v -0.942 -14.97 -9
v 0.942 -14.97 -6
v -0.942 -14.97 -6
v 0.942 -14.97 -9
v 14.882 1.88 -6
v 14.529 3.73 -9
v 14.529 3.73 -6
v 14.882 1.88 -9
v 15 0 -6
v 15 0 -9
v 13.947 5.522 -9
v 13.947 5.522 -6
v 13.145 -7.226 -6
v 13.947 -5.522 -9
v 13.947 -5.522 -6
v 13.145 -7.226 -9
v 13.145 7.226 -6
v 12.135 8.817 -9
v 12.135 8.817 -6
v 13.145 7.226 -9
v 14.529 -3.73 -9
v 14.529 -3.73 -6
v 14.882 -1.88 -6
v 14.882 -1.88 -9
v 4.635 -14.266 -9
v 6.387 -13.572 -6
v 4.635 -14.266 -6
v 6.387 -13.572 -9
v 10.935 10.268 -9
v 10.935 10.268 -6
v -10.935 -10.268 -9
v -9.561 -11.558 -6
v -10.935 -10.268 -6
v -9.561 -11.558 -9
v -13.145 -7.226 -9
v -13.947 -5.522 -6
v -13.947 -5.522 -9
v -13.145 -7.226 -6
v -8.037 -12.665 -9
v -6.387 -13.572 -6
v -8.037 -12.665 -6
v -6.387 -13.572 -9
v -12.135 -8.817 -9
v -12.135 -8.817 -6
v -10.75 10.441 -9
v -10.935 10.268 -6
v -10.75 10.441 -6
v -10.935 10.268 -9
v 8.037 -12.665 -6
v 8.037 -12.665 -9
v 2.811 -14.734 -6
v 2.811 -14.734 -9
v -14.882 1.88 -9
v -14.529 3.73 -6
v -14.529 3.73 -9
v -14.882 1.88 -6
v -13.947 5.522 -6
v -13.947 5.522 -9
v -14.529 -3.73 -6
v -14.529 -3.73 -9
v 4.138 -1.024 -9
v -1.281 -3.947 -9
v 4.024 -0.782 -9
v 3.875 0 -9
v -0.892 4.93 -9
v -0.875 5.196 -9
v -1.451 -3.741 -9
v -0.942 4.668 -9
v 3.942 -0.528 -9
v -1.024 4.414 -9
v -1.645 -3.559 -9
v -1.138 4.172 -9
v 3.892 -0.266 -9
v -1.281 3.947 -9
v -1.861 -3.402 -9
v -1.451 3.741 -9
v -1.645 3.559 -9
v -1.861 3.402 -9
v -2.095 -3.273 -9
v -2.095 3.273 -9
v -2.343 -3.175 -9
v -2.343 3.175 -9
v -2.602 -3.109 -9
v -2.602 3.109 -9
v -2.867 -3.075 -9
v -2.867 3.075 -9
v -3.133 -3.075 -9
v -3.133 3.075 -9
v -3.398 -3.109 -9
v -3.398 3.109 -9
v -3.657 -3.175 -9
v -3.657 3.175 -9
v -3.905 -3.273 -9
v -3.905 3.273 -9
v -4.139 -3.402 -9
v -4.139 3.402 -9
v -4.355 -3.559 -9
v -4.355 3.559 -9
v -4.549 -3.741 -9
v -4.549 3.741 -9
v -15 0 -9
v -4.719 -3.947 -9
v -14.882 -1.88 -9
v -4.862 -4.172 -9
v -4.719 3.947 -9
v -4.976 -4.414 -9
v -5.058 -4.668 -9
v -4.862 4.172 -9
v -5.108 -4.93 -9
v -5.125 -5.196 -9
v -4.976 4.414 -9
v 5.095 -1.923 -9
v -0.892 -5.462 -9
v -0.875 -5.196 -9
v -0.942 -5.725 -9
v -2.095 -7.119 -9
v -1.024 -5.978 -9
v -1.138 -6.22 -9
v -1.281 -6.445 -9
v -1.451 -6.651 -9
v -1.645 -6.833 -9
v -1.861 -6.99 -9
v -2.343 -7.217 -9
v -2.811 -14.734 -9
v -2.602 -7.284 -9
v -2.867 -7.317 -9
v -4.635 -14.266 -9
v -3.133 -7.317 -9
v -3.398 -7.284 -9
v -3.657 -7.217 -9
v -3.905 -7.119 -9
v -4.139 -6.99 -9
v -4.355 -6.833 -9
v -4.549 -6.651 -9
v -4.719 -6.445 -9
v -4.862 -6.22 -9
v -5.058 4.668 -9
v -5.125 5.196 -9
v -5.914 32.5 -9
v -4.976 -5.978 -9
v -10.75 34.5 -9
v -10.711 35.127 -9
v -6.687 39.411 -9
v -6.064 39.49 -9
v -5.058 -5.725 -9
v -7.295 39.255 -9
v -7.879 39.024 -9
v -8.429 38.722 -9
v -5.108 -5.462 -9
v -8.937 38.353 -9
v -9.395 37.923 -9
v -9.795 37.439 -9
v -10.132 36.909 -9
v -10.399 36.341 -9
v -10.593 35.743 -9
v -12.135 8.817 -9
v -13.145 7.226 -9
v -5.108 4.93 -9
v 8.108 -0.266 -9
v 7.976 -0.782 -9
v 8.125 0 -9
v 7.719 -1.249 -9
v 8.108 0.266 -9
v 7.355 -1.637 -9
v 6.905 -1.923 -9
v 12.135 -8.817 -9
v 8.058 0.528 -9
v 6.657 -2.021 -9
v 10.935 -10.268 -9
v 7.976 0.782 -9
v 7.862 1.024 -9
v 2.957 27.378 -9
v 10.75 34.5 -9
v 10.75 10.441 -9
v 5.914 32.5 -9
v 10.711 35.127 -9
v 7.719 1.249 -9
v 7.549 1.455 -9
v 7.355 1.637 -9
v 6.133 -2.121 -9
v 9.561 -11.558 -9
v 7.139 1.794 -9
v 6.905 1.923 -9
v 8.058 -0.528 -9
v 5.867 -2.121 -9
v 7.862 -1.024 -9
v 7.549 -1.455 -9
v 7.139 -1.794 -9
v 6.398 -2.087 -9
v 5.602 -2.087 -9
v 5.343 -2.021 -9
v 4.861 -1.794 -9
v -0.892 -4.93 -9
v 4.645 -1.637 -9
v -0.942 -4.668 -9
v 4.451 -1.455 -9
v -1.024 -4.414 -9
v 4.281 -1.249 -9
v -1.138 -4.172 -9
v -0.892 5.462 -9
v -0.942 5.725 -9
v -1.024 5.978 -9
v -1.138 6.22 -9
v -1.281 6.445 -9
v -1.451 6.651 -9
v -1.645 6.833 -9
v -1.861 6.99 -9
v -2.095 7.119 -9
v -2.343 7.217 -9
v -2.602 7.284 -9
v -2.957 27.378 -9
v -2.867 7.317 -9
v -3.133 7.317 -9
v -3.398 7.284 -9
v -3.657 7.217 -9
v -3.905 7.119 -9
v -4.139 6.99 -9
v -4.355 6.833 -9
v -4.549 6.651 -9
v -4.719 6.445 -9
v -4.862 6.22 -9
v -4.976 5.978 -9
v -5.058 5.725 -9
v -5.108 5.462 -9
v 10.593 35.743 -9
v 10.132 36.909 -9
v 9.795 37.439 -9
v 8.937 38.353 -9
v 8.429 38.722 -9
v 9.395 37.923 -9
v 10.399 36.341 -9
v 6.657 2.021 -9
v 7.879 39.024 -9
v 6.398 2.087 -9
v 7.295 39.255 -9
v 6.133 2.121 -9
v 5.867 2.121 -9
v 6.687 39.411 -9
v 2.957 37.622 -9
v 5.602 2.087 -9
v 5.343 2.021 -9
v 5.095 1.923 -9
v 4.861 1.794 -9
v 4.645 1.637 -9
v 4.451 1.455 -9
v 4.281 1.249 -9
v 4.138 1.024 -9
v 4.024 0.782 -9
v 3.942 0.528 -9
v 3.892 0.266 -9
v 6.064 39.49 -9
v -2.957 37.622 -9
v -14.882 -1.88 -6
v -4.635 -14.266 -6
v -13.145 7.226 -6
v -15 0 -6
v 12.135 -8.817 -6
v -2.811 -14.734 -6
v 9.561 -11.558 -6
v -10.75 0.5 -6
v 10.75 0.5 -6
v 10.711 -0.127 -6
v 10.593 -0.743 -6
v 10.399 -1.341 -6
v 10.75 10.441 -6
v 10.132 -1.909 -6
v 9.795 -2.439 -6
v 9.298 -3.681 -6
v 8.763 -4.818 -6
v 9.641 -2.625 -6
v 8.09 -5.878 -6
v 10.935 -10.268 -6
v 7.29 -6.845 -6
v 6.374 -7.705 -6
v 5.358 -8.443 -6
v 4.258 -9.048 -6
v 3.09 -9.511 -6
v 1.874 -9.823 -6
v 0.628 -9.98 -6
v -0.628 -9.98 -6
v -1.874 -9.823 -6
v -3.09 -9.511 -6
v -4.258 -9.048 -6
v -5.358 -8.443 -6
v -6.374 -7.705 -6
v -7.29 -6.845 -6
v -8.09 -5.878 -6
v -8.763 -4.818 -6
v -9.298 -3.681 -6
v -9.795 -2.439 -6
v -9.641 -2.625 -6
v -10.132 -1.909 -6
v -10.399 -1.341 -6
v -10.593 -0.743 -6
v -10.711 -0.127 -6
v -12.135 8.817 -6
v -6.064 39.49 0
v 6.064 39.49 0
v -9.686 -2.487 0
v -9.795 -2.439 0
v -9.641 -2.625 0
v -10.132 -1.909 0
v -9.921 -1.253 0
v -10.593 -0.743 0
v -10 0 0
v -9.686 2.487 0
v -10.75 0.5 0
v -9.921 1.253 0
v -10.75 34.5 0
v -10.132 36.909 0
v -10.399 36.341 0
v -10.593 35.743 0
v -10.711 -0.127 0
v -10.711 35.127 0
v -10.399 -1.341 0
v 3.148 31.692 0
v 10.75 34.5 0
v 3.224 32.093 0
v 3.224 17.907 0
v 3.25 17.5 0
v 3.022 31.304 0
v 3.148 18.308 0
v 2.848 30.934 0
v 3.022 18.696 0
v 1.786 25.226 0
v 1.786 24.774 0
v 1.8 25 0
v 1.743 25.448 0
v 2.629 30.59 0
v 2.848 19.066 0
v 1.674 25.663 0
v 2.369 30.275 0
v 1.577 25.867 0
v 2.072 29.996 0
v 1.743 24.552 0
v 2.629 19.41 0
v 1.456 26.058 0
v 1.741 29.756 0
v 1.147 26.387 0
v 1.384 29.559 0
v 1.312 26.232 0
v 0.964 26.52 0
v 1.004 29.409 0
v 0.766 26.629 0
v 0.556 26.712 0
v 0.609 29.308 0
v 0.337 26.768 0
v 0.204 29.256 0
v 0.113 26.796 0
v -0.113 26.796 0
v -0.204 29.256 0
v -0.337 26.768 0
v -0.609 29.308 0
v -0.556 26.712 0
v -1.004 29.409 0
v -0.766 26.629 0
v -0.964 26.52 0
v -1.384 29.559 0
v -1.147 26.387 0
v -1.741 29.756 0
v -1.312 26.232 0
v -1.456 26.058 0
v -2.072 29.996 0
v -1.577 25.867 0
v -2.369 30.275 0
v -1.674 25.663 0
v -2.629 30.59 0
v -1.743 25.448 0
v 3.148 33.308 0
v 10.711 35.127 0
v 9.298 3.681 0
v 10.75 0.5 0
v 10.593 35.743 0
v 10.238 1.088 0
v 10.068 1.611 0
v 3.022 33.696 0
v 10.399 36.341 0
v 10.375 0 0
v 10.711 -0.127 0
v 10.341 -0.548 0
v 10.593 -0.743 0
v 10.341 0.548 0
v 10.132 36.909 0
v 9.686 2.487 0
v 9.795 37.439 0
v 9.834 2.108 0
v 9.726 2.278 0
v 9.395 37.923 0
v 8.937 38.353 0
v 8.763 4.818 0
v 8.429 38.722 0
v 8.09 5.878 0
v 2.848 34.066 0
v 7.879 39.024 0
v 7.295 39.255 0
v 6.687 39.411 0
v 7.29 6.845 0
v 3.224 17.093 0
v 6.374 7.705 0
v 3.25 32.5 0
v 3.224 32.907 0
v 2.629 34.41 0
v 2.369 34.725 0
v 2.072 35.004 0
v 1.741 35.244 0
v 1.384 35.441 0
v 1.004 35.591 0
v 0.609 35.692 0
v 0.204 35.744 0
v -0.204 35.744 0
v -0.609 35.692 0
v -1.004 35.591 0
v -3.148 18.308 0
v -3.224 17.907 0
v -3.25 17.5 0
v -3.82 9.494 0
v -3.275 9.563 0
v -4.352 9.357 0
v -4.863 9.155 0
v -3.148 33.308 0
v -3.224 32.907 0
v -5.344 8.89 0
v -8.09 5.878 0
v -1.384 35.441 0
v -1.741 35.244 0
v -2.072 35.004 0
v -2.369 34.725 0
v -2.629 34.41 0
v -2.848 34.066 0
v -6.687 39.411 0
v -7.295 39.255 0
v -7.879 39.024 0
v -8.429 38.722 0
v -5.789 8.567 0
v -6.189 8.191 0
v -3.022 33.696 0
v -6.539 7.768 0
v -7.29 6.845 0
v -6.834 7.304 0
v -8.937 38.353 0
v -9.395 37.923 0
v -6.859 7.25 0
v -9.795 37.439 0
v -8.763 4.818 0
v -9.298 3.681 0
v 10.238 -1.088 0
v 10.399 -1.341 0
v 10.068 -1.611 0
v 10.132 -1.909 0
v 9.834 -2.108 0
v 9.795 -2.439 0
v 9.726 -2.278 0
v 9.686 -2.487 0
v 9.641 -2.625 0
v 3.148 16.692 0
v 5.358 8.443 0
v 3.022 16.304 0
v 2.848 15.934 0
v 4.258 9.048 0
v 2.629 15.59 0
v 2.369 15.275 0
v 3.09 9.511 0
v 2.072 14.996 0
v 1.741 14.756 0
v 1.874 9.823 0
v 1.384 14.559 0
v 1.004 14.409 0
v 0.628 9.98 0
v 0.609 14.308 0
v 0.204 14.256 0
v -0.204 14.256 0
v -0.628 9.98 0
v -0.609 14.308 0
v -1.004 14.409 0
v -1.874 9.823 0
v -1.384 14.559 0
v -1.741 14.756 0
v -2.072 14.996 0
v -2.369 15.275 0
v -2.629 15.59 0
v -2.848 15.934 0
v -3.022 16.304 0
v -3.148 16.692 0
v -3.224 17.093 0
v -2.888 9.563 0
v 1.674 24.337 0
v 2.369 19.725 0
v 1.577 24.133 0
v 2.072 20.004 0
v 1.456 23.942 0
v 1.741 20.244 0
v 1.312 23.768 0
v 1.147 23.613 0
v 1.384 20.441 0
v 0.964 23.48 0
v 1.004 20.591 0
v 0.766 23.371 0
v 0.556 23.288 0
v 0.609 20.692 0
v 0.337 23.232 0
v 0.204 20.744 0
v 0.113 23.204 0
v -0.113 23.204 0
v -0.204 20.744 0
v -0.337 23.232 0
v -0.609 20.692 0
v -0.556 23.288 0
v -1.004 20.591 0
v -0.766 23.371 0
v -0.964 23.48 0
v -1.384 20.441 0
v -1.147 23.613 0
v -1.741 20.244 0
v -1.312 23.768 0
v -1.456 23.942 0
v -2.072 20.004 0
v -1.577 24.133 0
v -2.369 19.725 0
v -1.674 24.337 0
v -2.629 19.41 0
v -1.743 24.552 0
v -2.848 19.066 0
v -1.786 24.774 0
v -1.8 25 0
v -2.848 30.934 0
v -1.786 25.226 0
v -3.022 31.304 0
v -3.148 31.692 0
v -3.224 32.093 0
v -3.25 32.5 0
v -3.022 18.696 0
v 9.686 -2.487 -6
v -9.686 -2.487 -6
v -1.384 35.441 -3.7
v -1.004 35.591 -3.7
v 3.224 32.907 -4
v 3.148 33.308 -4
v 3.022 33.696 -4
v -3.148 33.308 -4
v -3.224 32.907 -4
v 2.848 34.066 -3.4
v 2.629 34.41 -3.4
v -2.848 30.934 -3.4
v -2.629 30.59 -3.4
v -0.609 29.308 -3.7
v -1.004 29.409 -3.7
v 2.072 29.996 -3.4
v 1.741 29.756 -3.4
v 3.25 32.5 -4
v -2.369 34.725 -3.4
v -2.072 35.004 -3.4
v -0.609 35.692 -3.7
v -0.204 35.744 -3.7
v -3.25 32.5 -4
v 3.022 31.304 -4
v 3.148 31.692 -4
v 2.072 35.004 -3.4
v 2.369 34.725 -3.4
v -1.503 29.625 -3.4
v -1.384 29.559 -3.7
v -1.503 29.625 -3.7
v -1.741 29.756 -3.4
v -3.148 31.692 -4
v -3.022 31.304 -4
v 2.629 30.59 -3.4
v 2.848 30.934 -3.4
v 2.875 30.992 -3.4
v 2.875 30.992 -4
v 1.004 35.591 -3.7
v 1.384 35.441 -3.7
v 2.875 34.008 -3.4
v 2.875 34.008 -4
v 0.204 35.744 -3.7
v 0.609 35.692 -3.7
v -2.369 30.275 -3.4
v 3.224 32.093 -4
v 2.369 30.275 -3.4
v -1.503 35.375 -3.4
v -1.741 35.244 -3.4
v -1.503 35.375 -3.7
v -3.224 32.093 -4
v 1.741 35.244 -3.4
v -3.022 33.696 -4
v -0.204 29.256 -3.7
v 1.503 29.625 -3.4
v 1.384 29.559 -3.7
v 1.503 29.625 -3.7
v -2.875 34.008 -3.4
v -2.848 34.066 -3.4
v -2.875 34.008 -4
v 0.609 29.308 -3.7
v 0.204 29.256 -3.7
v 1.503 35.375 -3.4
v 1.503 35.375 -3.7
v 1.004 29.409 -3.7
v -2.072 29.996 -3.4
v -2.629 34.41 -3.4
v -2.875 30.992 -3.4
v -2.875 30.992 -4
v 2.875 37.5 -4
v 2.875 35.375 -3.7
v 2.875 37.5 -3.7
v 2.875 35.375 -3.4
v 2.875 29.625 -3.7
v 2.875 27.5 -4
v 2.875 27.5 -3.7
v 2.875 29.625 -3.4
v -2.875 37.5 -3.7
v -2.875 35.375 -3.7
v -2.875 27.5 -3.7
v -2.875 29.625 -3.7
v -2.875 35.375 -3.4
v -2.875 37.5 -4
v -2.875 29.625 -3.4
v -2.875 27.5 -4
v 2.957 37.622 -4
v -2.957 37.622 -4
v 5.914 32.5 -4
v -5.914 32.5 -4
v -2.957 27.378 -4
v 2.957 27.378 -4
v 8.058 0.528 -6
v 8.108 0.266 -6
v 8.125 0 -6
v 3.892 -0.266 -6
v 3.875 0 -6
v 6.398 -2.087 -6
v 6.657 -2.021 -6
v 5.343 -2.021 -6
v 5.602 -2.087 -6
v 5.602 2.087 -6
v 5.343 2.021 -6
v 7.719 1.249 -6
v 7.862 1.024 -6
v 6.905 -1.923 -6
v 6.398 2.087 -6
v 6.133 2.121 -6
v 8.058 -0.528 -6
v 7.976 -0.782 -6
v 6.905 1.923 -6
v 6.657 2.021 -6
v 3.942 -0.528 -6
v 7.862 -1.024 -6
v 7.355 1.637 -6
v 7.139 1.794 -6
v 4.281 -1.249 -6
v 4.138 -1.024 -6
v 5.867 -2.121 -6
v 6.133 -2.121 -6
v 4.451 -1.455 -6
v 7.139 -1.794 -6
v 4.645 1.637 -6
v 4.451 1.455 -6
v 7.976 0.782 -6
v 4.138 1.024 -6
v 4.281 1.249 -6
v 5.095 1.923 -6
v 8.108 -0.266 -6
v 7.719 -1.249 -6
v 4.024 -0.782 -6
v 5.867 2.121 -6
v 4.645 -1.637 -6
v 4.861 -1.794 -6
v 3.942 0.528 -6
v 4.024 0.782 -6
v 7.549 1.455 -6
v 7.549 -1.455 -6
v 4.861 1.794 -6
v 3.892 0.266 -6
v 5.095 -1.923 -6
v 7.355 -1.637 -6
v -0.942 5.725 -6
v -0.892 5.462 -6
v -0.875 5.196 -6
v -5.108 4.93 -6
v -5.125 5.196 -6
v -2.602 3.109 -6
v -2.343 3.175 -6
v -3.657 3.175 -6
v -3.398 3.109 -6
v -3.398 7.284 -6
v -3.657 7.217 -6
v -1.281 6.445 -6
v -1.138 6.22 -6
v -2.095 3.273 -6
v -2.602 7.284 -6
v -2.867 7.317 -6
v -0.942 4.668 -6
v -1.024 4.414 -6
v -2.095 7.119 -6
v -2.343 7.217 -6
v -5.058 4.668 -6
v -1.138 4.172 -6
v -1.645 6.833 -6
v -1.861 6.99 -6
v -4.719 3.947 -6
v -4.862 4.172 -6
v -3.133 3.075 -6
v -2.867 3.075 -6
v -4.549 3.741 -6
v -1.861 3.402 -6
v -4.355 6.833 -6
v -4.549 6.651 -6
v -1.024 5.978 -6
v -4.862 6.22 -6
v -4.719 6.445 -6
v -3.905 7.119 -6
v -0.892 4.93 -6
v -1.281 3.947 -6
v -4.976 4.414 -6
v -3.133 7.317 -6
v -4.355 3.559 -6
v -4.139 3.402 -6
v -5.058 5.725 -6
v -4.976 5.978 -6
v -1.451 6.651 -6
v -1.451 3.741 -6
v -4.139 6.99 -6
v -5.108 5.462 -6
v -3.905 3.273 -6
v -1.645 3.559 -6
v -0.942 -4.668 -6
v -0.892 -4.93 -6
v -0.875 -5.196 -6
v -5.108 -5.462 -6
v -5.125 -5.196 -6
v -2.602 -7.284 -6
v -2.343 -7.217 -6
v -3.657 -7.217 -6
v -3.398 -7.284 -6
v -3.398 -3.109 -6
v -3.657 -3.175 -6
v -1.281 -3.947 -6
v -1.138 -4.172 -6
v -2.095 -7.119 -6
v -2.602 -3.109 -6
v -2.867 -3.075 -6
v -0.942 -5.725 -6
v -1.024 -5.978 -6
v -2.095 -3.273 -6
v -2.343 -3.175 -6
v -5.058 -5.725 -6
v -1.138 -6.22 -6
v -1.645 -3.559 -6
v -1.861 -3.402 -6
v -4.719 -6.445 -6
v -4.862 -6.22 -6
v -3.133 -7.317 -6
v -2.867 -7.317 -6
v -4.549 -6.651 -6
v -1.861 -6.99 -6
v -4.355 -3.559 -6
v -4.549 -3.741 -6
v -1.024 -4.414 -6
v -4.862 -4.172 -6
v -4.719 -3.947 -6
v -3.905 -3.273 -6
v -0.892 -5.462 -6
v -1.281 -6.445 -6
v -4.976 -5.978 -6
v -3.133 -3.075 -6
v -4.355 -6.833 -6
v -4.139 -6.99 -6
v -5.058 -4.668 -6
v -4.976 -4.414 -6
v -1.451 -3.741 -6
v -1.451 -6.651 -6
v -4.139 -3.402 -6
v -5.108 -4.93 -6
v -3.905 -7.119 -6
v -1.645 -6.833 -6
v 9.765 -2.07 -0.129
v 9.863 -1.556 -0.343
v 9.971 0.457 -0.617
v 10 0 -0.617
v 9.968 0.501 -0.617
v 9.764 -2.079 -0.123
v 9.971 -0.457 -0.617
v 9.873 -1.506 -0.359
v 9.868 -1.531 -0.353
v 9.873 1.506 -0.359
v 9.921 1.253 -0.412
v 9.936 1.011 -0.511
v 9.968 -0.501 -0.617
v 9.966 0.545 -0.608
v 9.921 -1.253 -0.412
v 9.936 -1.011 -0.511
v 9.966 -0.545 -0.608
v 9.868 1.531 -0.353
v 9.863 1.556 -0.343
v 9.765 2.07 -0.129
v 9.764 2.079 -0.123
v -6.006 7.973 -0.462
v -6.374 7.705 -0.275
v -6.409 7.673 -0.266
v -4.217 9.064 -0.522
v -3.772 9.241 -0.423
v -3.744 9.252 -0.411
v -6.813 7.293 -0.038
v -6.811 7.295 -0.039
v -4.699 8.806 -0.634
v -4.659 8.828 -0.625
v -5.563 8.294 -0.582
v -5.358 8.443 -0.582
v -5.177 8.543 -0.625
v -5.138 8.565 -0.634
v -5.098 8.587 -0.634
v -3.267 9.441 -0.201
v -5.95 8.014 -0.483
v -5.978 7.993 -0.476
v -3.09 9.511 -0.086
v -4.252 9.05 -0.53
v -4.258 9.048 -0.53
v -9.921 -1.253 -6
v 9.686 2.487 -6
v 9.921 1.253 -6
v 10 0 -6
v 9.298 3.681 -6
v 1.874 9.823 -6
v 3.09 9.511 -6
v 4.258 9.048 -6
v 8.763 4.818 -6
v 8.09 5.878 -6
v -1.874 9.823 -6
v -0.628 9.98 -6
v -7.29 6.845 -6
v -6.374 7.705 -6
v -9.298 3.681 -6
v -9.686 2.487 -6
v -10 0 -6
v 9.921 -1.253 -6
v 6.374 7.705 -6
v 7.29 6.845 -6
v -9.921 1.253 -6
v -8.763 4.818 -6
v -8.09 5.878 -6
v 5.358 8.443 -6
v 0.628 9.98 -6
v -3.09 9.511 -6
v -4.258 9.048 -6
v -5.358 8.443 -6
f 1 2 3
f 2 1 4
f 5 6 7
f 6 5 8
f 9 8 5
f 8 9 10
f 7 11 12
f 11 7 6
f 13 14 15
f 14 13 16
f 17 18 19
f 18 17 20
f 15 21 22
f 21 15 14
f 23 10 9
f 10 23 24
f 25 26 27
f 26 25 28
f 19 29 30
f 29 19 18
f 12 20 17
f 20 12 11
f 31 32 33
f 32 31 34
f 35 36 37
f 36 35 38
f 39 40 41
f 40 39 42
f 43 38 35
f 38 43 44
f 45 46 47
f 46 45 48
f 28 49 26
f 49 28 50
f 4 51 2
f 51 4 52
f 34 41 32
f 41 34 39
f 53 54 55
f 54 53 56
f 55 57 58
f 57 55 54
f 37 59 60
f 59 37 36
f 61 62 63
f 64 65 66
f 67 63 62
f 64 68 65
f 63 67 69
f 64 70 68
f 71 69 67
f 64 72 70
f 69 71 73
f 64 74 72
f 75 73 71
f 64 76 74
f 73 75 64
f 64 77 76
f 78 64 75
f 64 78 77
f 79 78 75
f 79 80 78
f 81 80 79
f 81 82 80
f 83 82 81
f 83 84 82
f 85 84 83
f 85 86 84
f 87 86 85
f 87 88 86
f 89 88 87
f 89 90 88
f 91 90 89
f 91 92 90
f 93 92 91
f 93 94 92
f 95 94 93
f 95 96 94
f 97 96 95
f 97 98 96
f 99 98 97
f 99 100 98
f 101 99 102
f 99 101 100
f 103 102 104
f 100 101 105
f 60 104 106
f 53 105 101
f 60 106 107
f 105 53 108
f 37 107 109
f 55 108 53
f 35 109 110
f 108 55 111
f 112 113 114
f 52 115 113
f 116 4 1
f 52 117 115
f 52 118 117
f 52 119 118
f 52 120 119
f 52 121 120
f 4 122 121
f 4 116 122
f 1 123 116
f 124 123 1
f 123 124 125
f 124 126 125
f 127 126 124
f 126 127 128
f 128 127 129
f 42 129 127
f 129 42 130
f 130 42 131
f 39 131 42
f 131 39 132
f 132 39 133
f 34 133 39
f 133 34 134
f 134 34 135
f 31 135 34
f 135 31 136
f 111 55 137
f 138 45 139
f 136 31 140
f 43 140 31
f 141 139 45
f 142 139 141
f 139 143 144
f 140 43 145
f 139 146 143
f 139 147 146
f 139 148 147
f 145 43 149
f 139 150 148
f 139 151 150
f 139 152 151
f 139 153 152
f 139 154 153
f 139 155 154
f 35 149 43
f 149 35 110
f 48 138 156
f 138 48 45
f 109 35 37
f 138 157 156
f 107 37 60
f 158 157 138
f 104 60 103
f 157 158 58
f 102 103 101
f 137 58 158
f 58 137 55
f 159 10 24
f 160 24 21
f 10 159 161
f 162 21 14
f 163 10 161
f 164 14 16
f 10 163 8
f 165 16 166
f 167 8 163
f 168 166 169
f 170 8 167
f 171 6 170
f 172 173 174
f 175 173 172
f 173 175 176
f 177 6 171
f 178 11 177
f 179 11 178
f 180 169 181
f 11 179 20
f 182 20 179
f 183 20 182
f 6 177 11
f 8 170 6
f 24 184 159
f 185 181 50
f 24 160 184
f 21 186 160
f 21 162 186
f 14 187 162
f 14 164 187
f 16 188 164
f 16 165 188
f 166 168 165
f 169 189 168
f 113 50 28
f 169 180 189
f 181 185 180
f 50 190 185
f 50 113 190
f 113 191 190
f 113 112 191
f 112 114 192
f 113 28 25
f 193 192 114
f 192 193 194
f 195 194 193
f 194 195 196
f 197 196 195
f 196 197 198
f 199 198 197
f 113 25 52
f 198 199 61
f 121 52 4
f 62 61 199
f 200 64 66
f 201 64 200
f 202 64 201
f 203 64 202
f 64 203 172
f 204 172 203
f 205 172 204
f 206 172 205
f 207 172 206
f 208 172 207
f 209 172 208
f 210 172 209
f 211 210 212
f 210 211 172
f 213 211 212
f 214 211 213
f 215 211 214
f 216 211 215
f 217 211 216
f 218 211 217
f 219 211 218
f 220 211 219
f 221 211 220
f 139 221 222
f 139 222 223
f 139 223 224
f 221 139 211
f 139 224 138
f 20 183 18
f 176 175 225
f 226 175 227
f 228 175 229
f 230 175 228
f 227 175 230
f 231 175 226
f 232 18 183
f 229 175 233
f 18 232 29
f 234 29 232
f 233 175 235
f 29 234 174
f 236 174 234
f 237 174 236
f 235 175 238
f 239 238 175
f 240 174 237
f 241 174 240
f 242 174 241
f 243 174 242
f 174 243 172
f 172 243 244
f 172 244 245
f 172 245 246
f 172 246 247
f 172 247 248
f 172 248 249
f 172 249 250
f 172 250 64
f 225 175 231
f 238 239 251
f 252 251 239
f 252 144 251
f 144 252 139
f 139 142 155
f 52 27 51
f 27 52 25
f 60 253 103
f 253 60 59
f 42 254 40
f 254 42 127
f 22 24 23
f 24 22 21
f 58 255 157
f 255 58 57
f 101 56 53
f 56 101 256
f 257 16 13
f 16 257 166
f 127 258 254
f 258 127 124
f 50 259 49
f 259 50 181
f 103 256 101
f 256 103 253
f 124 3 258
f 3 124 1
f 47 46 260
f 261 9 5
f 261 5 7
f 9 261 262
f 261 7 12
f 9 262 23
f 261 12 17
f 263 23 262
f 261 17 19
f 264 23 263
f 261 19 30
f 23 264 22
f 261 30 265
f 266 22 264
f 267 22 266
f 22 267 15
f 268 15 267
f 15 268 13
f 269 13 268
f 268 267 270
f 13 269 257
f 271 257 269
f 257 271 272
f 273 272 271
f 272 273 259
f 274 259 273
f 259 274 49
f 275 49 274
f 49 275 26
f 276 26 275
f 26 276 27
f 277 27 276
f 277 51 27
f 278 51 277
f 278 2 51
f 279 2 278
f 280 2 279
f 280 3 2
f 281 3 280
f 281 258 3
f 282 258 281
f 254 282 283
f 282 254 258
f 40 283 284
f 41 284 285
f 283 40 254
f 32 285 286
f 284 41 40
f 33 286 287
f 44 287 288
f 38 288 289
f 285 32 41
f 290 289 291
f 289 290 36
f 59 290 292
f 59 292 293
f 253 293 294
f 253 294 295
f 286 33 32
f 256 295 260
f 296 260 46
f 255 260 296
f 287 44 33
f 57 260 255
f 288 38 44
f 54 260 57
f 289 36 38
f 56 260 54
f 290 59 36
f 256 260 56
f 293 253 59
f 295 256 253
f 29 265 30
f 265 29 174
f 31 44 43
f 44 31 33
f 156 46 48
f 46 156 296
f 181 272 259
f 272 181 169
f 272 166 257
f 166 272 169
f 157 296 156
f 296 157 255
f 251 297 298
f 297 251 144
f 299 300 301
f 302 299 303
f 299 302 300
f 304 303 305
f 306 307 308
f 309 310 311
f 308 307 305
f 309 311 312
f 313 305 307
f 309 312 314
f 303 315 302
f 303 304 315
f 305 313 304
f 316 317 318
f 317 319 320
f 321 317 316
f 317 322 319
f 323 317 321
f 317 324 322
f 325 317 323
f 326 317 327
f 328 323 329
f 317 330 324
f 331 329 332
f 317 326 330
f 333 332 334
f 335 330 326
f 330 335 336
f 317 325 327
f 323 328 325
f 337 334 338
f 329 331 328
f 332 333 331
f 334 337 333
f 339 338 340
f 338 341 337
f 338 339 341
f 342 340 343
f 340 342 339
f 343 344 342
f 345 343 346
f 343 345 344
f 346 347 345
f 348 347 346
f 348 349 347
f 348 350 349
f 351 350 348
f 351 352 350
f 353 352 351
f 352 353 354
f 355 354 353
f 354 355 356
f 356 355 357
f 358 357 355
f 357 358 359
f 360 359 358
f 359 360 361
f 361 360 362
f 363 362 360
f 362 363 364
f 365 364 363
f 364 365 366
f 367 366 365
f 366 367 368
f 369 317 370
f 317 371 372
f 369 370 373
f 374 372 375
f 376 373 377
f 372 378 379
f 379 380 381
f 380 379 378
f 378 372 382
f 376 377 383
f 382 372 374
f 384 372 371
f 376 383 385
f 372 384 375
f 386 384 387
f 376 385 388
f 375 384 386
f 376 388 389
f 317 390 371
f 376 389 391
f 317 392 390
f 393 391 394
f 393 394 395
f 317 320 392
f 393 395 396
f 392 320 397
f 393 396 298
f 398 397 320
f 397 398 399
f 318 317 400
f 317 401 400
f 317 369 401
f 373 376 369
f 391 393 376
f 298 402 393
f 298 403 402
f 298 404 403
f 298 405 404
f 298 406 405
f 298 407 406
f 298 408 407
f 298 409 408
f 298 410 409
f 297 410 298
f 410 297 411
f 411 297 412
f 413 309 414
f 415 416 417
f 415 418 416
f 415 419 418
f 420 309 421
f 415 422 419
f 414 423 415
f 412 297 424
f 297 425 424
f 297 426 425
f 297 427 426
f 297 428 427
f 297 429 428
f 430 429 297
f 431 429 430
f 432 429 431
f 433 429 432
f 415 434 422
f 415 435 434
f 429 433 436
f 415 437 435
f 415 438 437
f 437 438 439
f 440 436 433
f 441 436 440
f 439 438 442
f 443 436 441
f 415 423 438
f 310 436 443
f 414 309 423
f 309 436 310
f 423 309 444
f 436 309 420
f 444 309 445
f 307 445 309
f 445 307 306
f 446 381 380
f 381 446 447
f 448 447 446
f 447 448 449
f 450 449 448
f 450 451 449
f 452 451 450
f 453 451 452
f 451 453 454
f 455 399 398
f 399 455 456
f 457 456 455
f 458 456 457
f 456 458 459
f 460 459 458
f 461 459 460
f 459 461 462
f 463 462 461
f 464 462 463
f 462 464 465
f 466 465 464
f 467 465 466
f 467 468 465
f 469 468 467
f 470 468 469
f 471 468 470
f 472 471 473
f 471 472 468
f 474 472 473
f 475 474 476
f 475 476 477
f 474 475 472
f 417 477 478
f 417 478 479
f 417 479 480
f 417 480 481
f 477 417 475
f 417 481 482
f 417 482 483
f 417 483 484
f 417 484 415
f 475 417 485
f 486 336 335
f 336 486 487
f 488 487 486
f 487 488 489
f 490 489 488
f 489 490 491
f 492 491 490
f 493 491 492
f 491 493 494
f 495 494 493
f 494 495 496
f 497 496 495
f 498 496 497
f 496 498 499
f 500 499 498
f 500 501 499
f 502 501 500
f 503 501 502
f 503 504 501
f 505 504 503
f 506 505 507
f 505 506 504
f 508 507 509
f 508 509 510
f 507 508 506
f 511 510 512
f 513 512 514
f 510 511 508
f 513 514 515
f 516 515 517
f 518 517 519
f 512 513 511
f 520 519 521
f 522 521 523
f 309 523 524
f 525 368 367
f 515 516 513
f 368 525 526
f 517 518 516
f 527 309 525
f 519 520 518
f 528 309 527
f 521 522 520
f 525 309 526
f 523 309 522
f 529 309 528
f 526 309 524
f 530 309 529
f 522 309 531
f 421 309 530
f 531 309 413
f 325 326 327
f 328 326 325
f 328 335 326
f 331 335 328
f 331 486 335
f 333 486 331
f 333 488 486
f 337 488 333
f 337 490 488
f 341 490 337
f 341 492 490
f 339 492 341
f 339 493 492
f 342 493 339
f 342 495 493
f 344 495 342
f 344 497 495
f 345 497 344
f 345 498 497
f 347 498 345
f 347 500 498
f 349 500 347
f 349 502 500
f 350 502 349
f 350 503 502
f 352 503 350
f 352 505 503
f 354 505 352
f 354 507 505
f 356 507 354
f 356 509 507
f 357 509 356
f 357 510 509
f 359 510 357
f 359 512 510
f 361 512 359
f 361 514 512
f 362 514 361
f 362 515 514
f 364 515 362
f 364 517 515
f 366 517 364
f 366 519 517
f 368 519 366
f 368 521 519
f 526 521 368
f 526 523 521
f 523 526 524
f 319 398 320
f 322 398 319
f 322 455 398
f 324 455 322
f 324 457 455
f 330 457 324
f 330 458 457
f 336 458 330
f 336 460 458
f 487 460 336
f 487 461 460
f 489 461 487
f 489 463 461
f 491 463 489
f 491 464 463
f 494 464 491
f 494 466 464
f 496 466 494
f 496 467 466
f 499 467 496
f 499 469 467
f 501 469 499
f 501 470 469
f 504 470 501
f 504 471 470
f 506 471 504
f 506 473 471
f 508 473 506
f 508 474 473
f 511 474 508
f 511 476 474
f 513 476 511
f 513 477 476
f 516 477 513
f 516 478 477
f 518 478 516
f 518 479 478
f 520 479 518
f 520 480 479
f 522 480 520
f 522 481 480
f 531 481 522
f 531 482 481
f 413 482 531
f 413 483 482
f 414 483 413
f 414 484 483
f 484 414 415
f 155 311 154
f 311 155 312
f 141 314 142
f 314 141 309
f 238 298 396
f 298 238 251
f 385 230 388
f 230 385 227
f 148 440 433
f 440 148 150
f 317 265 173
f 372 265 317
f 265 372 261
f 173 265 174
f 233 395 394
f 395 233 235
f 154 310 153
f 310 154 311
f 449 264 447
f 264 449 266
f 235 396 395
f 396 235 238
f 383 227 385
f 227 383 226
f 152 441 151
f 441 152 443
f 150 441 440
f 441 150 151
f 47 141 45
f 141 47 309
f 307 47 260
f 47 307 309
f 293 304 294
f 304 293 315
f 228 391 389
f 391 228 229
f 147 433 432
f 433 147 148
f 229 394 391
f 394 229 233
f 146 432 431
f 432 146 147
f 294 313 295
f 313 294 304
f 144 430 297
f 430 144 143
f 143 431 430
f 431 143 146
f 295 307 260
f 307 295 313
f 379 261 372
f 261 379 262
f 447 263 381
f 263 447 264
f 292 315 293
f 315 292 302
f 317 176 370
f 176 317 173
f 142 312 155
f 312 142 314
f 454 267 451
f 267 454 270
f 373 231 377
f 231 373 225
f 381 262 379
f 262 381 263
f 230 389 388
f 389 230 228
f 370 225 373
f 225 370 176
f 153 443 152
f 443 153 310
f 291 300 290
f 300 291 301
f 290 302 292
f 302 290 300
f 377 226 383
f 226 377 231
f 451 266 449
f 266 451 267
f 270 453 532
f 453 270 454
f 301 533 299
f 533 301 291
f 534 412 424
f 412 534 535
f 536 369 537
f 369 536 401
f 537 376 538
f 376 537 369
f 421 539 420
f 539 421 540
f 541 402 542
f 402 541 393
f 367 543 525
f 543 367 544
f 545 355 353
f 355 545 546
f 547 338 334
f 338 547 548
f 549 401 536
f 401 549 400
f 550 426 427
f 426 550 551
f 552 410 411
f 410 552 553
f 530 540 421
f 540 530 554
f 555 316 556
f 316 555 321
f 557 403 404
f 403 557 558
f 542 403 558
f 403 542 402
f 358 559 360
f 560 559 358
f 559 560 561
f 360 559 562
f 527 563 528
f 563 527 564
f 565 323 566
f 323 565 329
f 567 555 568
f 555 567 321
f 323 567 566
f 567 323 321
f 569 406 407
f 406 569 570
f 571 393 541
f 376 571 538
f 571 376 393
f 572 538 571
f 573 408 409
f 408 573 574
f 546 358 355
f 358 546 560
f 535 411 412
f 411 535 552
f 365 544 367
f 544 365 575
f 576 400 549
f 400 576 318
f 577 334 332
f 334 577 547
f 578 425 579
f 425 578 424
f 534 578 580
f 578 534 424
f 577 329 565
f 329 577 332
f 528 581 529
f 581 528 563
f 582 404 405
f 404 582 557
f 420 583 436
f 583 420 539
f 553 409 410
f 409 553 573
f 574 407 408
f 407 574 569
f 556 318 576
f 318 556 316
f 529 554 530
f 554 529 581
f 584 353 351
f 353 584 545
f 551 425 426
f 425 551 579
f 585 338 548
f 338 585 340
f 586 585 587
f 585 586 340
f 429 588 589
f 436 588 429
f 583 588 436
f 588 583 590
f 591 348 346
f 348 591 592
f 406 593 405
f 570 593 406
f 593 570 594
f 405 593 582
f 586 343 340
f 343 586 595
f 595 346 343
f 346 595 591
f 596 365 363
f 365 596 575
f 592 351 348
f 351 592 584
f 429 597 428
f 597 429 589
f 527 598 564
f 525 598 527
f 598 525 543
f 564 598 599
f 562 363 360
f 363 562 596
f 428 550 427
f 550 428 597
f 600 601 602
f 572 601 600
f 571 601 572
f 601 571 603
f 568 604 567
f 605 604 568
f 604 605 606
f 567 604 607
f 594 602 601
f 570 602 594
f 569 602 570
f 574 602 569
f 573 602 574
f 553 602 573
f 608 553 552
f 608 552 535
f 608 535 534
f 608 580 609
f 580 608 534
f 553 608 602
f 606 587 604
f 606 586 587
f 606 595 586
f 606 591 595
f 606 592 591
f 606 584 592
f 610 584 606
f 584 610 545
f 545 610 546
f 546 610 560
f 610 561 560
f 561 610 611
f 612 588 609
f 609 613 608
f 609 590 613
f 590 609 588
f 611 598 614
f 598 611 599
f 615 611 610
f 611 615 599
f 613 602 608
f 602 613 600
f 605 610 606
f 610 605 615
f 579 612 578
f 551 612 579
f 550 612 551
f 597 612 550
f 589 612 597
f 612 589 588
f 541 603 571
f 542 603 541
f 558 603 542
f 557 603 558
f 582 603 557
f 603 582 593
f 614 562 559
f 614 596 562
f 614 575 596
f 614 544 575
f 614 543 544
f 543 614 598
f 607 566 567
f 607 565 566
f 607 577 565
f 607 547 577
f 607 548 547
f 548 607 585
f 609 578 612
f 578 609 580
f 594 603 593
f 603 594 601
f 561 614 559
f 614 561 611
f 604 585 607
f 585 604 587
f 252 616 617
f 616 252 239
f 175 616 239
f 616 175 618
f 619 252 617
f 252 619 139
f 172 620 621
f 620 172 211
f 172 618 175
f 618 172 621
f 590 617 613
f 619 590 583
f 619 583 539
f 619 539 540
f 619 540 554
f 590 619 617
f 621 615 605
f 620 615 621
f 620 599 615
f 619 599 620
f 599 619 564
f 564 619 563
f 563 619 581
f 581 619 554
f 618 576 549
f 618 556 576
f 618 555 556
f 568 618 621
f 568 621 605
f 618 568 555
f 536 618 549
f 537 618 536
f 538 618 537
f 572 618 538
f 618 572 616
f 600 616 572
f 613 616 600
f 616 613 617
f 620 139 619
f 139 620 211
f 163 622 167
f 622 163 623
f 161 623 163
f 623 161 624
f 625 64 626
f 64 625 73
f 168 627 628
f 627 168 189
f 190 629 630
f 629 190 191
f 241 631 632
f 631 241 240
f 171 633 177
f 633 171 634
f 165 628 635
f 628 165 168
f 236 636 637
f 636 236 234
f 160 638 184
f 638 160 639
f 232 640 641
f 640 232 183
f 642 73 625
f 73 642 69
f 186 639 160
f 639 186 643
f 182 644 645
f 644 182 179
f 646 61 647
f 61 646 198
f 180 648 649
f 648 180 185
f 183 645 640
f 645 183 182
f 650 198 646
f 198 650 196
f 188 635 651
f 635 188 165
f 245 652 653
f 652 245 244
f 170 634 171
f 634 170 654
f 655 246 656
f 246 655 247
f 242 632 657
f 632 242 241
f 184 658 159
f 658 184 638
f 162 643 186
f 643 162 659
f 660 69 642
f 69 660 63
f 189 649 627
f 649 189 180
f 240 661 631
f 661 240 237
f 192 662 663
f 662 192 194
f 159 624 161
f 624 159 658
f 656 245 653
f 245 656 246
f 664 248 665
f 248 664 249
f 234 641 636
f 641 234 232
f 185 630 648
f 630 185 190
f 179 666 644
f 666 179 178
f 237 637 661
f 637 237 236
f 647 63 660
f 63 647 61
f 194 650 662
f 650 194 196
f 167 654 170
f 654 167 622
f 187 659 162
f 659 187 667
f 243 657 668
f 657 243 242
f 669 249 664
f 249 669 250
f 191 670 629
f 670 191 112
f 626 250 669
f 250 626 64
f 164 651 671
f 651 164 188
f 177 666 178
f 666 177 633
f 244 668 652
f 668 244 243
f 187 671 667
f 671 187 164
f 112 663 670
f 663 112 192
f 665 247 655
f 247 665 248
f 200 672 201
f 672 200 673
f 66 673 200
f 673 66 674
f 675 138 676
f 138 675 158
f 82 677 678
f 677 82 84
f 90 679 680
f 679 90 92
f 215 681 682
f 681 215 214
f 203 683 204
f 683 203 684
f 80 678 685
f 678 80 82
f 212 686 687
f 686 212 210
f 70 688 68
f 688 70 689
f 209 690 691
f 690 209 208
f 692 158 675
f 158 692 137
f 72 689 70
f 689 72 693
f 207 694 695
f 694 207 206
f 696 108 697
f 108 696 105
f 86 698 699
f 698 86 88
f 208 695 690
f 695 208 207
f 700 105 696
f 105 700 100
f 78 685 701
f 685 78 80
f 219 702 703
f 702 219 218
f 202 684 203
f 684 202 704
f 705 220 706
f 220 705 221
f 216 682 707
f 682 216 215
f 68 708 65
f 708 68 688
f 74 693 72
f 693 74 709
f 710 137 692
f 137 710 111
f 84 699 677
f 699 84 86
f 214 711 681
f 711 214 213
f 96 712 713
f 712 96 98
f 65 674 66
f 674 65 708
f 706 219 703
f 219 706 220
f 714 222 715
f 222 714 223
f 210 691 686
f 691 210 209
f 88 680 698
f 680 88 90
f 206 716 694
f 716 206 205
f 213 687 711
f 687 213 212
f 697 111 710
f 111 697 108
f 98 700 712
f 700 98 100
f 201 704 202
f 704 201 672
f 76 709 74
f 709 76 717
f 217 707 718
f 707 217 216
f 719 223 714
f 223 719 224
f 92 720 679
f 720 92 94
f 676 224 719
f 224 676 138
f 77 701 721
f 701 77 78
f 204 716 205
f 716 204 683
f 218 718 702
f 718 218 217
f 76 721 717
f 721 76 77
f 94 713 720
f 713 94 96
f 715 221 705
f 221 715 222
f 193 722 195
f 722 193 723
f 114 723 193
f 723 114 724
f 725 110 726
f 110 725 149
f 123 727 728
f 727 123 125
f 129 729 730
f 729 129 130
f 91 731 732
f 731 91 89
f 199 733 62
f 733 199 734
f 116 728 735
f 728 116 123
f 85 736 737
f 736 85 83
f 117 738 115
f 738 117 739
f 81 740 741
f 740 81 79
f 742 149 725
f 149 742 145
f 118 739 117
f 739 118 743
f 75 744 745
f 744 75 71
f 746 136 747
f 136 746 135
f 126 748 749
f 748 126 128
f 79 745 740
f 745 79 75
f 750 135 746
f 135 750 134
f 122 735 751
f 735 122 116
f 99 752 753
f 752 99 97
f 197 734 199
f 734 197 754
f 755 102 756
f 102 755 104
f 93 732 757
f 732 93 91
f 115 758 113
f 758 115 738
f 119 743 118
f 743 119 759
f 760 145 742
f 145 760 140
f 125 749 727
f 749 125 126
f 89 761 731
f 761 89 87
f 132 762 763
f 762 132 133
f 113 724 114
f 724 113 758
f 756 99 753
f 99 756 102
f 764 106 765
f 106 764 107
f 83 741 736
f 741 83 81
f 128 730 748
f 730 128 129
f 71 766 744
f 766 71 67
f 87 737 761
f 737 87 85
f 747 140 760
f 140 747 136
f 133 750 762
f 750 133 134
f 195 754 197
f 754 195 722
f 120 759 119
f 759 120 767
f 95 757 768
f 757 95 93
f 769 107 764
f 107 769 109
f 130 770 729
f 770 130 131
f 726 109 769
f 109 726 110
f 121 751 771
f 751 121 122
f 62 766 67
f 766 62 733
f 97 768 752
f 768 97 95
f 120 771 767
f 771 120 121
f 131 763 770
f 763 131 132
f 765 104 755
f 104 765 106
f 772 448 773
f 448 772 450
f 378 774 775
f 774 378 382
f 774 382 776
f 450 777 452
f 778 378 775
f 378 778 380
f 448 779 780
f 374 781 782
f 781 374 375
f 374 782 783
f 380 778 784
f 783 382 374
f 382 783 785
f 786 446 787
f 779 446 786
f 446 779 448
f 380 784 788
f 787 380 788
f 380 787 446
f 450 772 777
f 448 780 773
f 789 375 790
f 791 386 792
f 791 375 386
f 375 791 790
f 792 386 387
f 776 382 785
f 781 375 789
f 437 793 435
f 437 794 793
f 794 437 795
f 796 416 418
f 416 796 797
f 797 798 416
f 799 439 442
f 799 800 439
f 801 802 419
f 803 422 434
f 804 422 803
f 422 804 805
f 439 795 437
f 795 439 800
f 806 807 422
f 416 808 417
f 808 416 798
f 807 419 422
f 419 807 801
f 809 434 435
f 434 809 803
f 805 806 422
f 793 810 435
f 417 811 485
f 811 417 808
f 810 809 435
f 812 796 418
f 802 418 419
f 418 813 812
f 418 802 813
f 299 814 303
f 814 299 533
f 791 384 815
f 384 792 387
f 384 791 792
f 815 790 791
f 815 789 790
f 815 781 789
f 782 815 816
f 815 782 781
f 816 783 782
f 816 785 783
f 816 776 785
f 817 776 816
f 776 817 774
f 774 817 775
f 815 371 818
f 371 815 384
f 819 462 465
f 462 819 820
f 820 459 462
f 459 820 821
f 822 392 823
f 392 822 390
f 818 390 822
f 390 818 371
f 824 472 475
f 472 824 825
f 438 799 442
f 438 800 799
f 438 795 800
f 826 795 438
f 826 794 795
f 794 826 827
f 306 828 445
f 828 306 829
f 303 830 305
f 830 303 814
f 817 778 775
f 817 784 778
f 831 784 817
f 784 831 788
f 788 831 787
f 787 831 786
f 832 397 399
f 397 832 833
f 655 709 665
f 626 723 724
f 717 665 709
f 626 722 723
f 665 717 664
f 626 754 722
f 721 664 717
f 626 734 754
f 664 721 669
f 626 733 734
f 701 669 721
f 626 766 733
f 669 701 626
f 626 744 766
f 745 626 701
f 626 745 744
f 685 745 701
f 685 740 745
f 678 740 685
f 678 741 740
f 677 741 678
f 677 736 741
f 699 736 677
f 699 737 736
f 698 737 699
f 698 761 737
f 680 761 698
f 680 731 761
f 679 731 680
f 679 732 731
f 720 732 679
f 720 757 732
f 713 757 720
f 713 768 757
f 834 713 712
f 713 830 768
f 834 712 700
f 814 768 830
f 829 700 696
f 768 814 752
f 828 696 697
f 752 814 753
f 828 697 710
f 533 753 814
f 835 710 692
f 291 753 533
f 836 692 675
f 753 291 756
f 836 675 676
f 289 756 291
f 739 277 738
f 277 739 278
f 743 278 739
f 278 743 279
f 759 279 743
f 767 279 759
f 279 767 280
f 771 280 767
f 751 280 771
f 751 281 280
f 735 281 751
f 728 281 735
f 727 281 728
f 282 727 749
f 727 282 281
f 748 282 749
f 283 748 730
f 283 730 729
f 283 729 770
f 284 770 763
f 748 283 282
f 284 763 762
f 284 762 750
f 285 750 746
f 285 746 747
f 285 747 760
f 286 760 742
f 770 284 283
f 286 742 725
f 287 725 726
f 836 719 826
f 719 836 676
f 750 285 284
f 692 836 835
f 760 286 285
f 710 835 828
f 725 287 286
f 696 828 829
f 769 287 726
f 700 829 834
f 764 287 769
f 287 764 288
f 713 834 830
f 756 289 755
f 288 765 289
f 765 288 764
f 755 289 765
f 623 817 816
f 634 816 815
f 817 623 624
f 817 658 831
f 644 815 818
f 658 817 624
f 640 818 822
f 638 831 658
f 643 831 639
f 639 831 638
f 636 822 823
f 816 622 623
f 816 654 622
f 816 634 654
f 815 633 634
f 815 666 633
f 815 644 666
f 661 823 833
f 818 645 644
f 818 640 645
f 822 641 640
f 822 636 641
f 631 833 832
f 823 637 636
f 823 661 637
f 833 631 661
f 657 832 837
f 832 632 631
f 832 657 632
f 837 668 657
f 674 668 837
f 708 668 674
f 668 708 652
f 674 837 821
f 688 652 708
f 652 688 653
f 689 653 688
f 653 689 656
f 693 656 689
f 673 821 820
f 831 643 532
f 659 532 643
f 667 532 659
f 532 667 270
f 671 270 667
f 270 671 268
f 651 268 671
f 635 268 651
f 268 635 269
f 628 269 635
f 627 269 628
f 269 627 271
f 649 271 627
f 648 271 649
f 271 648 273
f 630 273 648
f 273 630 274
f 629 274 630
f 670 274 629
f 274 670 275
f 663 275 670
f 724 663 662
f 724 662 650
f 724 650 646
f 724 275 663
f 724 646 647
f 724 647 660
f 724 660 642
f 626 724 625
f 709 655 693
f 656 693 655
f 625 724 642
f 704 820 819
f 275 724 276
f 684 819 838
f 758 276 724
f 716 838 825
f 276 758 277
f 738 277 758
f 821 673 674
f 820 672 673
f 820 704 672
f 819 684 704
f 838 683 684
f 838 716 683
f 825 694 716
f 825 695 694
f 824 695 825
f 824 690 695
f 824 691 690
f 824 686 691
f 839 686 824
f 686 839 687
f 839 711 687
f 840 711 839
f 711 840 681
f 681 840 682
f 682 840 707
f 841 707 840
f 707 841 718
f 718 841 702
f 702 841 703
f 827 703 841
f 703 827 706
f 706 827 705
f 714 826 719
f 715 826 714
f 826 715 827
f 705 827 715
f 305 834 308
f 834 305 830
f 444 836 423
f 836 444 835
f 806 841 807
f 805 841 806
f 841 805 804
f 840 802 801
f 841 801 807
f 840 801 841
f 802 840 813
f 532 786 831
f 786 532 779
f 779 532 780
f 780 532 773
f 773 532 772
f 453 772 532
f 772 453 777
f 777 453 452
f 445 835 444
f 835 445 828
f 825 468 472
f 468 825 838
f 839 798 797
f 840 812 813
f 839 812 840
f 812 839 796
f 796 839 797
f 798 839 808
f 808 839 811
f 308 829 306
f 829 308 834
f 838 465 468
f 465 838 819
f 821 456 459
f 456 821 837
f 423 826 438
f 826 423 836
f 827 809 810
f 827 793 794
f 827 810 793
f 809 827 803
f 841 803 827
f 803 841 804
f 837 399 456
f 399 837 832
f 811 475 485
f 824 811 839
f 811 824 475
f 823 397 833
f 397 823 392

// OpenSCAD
$fn = 50;


difference() {
	union() {
		translate(v = [0, 0, -9.0000000000]) {
			cylinder(h = 3, r = 15.0000000000);
		}
		translate(v = [0, 17.5000000000, -9]) {
			hull() {
				translate(v = [-2.0000000000, 17.0000000000, 0]) {
					cylinder(h = 9, r = 5);
				}
				translate(v = [2.0000000000, 17.0000000000, 0]) {
					cylinder(h = 9, r = 5);
				}
				translate(v = [-2.0000000000, -17.0000000000, 0]) {
					cylinder(h = 9, r = 5);
				}
				translate(v = [2.0000000000, -17.0000000000, 0]) {
					cylinder(h = 9, r = 5);
				}
			}
		}
		translate(v = [0, 17.5000000000, -9]) {
			hull() {
				translate(v = [-5.7500000000, 17.0000000000, 0]) {
					cylinder(h = 9, r = 5);
				}
				translate(v = [5.7500000000, 17.0000000000, 0]) {
					cylinder(h = 9, r = 5);
				}
				translate(v = [-5.7500000000, -17.0000000000, 0]) {
					cylinder(h = 9, r = 5);
				}
				translate(v = [5.7500000000, -17.0000000000, 0]) {
					cylinder(h = 9, r = 5);
				}
			}
		}
		translate(v = [0, 0, -9.0000000000]) {
			cylinder(h = 9, r = 10.0000000000);
		}
	}
	union() {
		translate(v = [0, 32.5000000000, 0]) {
			rotate(a = [0, 0, 0]) {
				difference() {
					union() {
						translate(v = [0, 0, -50.0000000000]) {
							cylinder(h = 100, r = 3.2500000000);
						}
					}
					union();
				}
			}
		}
		translate(v = [0, 32.5000000000, -9]) {
			rotate(a = [0, 0, 0]) {
				difference() {
					union() {
						translate(v = [-2.8750000000, -5.0000000000, -0.3000000000]) {
							cube(size = [5.7500000000, 10, 0.3000000000]);
						}
						translate(v = [-2.8750000000, -2.8750000000, -0.6000000000]) {
							cube(size = [5.7500000000, 5.7500000000, 0.3000000000]);
						}
						translate(v = [-2.8750000000, -5.0000000000, 5]) {
							cube(size = [5.7500000000, 10, 0.3000000000]);
						}
						translate(v = [-2.8750000000, -2.8750000000, 5.3000000000]) {
							cube(size = [5.7500000000, 5.7500000000, 0.3000000000]);
						}
						linear_extrude(height = 5) {
							polygon(points = [[5.9142500000, 0.0000000000], [2.9571250000, 5.1218907443], [-2.9571250000, 5.1218907443], [-5.9142500000, 0.0000000000], [-2.9571250000, -5.1218907443], [2.9571250000, -5.1218907443]]);
						}
						translate(v = [-2.8750000000, -5.0000000000, -0.3000000000]) {
							cube(size = [5.7500000000, 10, 0.3000000000]);
						}
						translate(v = [-2.8750000000, -2.8750000000, -0.6000000000]) {
							cube(size = [5.7500000000, 5.7500000000, 0.3000000000]);
						}
						translate(v = [-2.8750000000, -5.0000000000, 5]) {
							cube(size = [5.7500000000, 10, 0.3000000000]);
						}
						translate(v = [-2.8750000000, -2.8750000000, 5.3000000000]) {
							cube(size = [5.7500000000, 5.7500000000, 0.3000000000]);
						}
						translate(v = [-2.8750000000, -5.0000000000, -0.3000000000]) {
							cube(size = [5.7500000000, 10, 0.3000000000]);
						}
						translate(v = [-2.8750000000, -2.8750000000, -0.6000000000]) {
							cube(size = [5.7500000000, 5.7500000000, 0.3000000000]);
						}
						translate(v = [-2.8750000000, -5.0000000000, 5]) {
							cube(size = [5.7500000000, 10, 0.3000000000]);
						}
						translate(v = [-2.8750000000, -2.8750000000, 5.3000000000]) {
							cube(size = [5.7500000000, 5.7500000000, 0.3000000000]);
						}
					}
					union();
				}
			}
		}
		translate(v = [6.0000000000, 0.0000000000, 41]) {
			rotate(a = [0, 0, 0]) {
				difference() {
					union() {
						translate(v = [0, 0, -59.0000000000]) {
							cylinder(h = 59, r = 2.0000000000);
						}
						translate(v = [0, 0, -3.7000000000]) {
							cylinder(h = 3.7000000000, r1 = 2.1250000000, r2 = 4.3750000000);
						}
						translate(v = [0, 0, -59.0000000000]) {
							cylinder(h = 59, r = 2.1250000000);
						}
						translate(v = [0, 0, -59.0000000000]) {
							cylinder(h = 59, r = 2.0000000000);
						}
					}
					union();
				}
			}
		}
		translate(v = [-3.0000000000, 5.1961524227, 41]) {
			rotate(a = [0, 0, 0]) {
				difference() {
					union() {
						translate(v = [0, 0, -59.0000000000]) {
							cylinder(h = 59, r = 2.0000000000);
						}
						translate(v = [0, 0, -3.7000000000]) {
							cylinder(h = 3.7000000000, r1 = 2.1250000000, r2 = 4.3750000000);
						}
						translate(v = [0, 0, -59.0000000000]) {
							cylinder(h = 59, r = 2.1250000000);
						}
						translate(v = [0, 0, -59.0000000000]) {
							cylinder(h = 59, r = 2.0000000000);
						}
					}
					union();
				}
			}
		}
		translate(v = [-3.0000000000, -5.1961524227, 41]) {
			rotate(a = [0, 0, 0]) {
				difference() {
					union() {
						translate(v = [0, 0, -59.0000000000]) {
							cylinder(h = 59, r = 2.0000000000);
						}
						translate(v = [0, 0, -3.7000000000]) {
							cylinder(h = 3.7000000000, r1 = 2.1250000000, r2 = 4.3750000000);
						}
						translate(v = [0, 0, -59.0000000000]) {
							cylinder(h = 59, r = 2.1250000000);
						}
						translate(v = [0, 0, -59.0000000000]) {
							cylinder(h = 59, r = 2.0000000000);
						}
					}
					union();
				}
			}
		}
		translate(v = [6.0000000000, 0.0000000000, 0]) {
			rotate(a = [0, 0, 0]) {
				difference() {
					union() {
						#translate(v = [0, 0, -9.0000000000]) {
							cylinder(h = 9, r = 2.0000000000);
						}
						#translate(v = [0, 0, -3.7000000000]) {
							cylinder(h = 3.7000000000, r = 10.0000000000, r1 = 2.1250000000, r2 = 4.3750000000);
						}
						#translate(v = [0, 0, -9.0000000000]) {
							cylinder(h = 9, r = 2.1250000000);
						}
						#translate(v = [0, 0, -9.0000000000]) {
							cylinder(h = 9, r = 2.0000000000);
						}
					}
					union();
				}
			}
		}
		translate(v = [-3.0000000000, 5.1961524227, 0]) {
			rotate(a = [0, 0, 0]) {
				difference() {
					union() {
						#translate(v = [0, 0, -9.0000000000]) {
							cylinder(h = 9, r = 2.0000000000);
						}
						#translate(v = [0, 0, -3.7000000000]) {
							cylinder(h = 3.7000000000, r = 10.0000000000, r1 = 2.1250000000, r2 = 4.3750000000);
						}
						#translate(v = [0, 0, -9.0000000000]) {
							cylinder(h = 9, r = 2.1250000000);
						}
						#translate(v = [0, 0, -9.0000000000]) {
							cylinder(h = 9, r = 2.0000000000);
						}
					}
					union();
				}
			}
		}
		translate(v = [-3.0000000000, -5.1961524227, 0]) {
			rotate(a = [0, 0, 0]) {
				difference() {
					union() {
						#translate(v = [0, 0, -9.0000000000]) {
							cylinder(h = 9, r = 2.0000000000);
						}
						#translate(v = [0, 0, -3.7000000000]) {
							cylinder(h = 3.7000000000, r = 10.0000000000, r1 = 2.1250000000, r2 = 4.3750000000);
						}
						#translate(v = [0, 0, -9.0000000000]) {
							cylinder(h = 9, r = 2.1250000000);
						}
						#translate(v = [0, 0, -9.0000000000]) {
							cylinder(h = 9, r = 2.0000000000);
						}
					}
					union();
				}
			}
		}
		translate(v = [0, 0, -6.0000000000]) {
			cylinder(h = 100, r = 10.0000000000);
		}
		translate(v = [0.0000000000, 32.5000000000, 0]) {
			cylinder(h = 9, r = 3.2500000000);
		}
		translate(v = [0.0000000000, 17.5000000000, 0]) {
			cylinder(h = 9, r = 3.2500000000);
		}
		translate(v = [0.0000000000, 25.0000000000, 0]) {
			cylinder(h = 9, r = 1.8000000000);
		}
	}
}
